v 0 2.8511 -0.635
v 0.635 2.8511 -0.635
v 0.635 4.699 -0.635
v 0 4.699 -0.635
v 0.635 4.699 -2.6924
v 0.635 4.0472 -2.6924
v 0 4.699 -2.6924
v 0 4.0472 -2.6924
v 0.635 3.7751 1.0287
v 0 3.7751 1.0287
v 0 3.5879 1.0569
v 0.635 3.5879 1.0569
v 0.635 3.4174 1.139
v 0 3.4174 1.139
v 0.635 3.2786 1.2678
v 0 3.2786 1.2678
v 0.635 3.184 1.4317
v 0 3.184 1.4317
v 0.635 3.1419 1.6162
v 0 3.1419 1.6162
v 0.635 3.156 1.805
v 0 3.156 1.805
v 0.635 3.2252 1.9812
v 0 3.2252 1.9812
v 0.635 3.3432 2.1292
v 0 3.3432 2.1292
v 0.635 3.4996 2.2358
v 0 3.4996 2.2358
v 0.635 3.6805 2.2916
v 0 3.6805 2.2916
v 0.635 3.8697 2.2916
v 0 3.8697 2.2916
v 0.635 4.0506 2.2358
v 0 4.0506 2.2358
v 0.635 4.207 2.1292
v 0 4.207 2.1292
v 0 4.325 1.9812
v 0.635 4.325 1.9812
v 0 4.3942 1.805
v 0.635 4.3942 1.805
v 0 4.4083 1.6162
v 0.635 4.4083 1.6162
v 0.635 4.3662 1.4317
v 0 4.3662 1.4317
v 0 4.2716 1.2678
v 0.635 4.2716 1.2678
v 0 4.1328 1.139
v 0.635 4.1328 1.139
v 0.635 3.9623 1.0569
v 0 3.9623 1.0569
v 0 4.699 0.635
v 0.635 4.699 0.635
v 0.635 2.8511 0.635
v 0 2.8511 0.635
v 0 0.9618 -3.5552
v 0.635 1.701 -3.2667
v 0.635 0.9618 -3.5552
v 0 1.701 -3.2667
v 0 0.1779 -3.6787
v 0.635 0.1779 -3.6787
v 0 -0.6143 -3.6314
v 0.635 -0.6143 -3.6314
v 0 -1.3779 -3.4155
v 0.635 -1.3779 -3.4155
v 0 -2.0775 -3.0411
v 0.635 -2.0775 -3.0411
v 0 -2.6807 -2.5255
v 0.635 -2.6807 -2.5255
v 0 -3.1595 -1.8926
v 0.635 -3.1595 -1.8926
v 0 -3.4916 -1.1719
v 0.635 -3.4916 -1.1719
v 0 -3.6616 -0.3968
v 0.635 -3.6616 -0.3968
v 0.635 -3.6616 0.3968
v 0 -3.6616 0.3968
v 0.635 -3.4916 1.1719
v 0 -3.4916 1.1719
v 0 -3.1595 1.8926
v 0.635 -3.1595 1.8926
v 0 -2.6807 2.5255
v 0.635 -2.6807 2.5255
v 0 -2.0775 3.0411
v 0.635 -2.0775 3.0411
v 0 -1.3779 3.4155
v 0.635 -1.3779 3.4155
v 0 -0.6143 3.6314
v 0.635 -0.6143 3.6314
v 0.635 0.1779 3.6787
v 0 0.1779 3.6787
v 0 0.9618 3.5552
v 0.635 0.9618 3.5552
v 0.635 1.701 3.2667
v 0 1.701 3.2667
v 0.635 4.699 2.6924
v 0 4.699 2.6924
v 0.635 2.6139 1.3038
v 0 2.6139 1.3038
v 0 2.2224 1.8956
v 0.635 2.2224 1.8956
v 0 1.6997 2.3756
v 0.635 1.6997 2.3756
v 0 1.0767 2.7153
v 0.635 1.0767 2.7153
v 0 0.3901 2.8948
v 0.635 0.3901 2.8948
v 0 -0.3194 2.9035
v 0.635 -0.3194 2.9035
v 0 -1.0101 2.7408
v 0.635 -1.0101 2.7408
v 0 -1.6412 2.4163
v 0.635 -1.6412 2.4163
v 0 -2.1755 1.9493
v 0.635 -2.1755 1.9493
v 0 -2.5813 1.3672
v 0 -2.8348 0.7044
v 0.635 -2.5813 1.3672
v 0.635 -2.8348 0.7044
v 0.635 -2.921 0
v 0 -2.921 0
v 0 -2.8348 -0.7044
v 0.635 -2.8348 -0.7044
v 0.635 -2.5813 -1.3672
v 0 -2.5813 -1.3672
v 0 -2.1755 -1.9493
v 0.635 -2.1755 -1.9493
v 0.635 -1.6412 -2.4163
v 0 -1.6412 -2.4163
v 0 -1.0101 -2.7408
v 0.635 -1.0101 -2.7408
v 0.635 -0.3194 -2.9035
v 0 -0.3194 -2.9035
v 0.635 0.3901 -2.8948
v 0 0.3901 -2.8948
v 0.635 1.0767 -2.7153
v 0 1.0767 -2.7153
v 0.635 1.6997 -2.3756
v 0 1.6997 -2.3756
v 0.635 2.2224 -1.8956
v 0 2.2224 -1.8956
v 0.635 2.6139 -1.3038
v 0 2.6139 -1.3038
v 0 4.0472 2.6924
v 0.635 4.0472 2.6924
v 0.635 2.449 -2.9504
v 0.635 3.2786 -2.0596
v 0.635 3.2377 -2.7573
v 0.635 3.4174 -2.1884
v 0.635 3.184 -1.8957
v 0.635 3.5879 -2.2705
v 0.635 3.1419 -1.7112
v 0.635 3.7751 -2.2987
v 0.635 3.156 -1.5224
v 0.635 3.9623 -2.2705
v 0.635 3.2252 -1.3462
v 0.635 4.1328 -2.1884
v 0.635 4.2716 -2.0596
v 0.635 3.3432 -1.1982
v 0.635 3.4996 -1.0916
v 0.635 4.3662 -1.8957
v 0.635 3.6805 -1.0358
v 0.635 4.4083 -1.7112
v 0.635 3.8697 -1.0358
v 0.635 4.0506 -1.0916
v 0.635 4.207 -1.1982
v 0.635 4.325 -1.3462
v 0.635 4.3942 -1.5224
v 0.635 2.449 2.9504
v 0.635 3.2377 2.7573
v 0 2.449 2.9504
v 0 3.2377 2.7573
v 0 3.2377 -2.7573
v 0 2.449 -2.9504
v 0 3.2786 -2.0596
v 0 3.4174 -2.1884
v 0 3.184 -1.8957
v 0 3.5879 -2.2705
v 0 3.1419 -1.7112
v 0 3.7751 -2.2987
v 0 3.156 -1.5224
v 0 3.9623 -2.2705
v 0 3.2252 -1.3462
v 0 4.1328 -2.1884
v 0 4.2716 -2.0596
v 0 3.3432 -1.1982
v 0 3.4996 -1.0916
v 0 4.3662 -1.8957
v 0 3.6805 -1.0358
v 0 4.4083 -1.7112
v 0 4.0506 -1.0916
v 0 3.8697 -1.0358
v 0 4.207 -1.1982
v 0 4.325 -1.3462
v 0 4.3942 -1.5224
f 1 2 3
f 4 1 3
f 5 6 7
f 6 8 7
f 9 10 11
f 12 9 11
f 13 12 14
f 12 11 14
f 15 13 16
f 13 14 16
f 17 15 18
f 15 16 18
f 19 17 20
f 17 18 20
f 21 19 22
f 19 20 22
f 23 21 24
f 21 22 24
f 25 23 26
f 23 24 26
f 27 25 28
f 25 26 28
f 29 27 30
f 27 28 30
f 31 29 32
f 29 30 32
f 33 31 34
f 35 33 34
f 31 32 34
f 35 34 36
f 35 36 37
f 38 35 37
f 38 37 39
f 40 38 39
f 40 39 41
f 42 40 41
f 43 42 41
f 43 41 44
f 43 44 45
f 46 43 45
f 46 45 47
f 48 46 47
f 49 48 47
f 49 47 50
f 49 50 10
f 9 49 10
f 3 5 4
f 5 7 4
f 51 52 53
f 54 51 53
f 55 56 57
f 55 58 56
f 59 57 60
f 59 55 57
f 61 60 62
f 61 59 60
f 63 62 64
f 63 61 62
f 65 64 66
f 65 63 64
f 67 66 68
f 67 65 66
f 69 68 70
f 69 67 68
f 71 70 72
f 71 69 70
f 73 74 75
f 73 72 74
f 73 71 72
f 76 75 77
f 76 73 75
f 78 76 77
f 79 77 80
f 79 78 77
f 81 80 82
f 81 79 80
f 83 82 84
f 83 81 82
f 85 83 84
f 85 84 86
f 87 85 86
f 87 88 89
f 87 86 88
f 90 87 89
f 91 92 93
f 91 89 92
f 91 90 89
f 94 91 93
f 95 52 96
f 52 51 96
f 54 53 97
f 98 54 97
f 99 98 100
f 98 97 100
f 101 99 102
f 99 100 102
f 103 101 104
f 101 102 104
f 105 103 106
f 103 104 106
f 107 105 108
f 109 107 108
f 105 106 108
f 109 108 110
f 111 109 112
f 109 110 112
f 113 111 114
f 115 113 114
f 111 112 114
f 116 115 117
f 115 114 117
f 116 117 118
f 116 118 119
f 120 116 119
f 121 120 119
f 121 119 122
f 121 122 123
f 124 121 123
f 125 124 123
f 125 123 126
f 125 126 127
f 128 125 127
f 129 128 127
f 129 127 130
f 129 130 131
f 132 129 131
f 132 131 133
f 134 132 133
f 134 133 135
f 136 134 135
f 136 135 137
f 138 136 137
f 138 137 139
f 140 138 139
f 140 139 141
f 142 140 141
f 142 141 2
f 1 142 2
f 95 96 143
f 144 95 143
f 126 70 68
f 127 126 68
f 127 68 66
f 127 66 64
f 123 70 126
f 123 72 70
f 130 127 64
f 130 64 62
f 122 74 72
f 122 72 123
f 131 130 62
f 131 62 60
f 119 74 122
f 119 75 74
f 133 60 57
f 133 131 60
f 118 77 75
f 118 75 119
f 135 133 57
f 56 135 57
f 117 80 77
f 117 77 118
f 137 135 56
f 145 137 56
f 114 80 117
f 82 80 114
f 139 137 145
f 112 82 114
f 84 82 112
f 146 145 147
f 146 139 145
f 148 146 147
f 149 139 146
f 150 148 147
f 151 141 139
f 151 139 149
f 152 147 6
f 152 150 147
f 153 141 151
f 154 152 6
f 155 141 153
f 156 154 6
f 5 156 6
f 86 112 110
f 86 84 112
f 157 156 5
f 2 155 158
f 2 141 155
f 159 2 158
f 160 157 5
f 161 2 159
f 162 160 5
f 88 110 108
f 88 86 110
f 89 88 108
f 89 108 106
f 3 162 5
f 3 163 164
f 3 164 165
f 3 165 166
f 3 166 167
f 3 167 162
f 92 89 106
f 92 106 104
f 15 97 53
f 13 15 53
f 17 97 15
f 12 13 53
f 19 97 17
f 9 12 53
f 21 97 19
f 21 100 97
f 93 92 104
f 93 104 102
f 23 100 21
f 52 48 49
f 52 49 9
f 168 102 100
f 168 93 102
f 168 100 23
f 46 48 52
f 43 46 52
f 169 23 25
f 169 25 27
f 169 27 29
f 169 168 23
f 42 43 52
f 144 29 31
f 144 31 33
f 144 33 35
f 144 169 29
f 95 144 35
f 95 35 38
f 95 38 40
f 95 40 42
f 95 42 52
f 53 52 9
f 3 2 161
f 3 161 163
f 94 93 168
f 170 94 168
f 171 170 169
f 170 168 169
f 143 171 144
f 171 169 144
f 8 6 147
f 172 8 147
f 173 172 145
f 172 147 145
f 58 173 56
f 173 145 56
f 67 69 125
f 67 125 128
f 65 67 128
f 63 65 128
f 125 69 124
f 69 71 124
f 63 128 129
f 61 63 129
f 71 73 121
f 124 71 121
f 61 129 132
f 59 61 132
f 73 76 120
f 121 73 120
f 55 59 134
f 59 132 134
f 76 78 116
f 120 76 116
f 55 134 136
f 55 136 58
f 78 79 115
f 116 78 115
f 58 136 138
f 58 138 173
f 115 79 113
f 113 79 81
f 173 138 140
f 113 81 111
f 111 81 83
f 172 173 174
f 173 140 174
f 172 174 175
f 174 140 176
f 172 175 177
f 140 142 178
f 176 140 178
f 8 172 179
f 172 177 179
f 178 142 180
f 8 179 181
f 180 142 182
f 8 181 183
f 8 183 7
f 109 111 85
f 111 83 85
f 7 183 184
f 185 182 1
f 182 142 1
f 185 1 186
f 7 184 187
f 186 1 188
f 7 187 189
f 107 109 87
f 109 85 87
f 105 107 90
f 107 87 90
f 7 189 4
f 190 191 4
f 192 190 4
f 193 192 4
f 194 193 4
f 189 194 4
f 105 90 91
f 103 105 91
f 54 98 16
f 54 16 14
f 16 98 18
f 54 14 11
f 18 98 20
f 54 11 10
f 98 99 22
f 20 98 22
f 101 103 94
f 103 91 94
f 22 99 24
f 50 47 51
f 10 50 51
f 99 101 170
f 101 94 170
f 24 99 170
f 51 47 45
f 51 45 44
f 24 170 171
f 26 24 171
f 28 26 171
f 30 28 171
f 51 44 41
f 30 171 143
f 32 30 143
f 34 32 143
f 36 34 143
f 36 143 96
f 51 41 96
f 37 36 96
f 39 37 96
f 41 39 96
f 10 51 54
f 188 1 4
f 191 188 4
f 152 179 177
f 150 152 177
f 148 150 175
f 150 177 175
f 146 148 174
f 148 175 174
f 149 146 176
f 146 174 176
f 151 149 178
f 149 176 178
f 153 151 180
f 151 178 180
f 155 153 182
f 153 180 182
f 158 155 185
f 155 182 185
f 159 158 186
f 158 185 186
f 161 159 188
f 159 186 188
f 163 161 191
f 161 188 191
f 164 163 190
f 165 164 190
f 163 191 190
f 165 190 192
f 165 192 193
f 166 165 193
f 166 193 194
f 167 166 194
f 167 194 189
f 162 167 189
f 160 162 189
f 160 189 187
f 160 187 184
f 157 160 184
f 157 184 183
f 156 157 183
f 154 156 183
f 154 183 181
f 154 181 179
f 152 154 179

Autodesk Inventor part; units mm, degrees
ref_plane "YZ Plane" through (0, 0, 0) normal (1, 0, 0) x (0, 1, 0)
ref_plane "XZ Plane" through (0, 0, 0) normal (0, 1, 0) x (-1, 0, 0)
ref_plane "XY Plane" through (0, 0, 0) normal (0, 0, 1) x (1, 0, 0)
sketch "Sketch1" plane through (0, 0, 0) normal (1, 0, 0) x (0, 1, 0)
  circle A0 centre (0, 0) radius 3.683
  line L0 (4.699, 2.6924) -> (0, 2.6924)
  line L1 (0, 2.6924) -> (0, -2.6924)
  line L2 (0, -2.6924) -> (4.699, -2.6924)
  line L3 (4.699, -2.6924) -> (4.699, 2.6924)
  dimension "d0" = 7.366
  dimension "d1" = 5.3848
  dimension "d2" = 4.699
extrude "Extrusion1" add sketch "Sketch1" along normal blind 0.635
fillet "Fillet1" radius 5.08 2 edges at (0.3175, 2.5131, -2.6924) (0.3175, 2.5131, 2.6924)
sketch "Sketch2" plane through (0.635, 0, 0) normal (1, 0, 0) x (0, 0, -1)
  arc A0 (-3.2667, 1.701) -> (3.2667, 1.701) centre (0, 0) ccw projected
  line L0 (2.6924, 4.699) -> (-2.6924, 4.699) projected
  circle A1 centre (0, 0) radius 2.921
  line L1 (-0.635, 2.8511) -> (0.635, 2.8511)
  line L2 (0.635, 2.8511) -> (0.635, 4.699)
  line L3 (0.635, 4.699) -> (-0.635, 4.699)
  line L4 (-0.635, 4.699) -> (-0.635, 2.8511)
  dimension "d6" = 5.842
  dimension "d7" = 1.27
extrude "Extrusion2" cut sketch "Sketch2" against normal through all
sketch "Sketch3" plane through (0.635, 0, 0) normal (1, 0, 0) x (0, 0, -1)
  line L0 (-0.635, 2.8511) -> (-2.6924, 4.699) construction
  line L1 (0.635, 2.8511) -> (2.6924, 4.699) construction
  point P0 (-1.6637, 3.7751)
  point P1 (1.6637, 3.7751)
hole "Hole1" at (0.635, 3.7751, 1.6637) at (0.635, 3.7751, -1.6637) direction (-1, 0, 0) diameter 1.27 end through all
properties part number "Horseshoe Clip"
